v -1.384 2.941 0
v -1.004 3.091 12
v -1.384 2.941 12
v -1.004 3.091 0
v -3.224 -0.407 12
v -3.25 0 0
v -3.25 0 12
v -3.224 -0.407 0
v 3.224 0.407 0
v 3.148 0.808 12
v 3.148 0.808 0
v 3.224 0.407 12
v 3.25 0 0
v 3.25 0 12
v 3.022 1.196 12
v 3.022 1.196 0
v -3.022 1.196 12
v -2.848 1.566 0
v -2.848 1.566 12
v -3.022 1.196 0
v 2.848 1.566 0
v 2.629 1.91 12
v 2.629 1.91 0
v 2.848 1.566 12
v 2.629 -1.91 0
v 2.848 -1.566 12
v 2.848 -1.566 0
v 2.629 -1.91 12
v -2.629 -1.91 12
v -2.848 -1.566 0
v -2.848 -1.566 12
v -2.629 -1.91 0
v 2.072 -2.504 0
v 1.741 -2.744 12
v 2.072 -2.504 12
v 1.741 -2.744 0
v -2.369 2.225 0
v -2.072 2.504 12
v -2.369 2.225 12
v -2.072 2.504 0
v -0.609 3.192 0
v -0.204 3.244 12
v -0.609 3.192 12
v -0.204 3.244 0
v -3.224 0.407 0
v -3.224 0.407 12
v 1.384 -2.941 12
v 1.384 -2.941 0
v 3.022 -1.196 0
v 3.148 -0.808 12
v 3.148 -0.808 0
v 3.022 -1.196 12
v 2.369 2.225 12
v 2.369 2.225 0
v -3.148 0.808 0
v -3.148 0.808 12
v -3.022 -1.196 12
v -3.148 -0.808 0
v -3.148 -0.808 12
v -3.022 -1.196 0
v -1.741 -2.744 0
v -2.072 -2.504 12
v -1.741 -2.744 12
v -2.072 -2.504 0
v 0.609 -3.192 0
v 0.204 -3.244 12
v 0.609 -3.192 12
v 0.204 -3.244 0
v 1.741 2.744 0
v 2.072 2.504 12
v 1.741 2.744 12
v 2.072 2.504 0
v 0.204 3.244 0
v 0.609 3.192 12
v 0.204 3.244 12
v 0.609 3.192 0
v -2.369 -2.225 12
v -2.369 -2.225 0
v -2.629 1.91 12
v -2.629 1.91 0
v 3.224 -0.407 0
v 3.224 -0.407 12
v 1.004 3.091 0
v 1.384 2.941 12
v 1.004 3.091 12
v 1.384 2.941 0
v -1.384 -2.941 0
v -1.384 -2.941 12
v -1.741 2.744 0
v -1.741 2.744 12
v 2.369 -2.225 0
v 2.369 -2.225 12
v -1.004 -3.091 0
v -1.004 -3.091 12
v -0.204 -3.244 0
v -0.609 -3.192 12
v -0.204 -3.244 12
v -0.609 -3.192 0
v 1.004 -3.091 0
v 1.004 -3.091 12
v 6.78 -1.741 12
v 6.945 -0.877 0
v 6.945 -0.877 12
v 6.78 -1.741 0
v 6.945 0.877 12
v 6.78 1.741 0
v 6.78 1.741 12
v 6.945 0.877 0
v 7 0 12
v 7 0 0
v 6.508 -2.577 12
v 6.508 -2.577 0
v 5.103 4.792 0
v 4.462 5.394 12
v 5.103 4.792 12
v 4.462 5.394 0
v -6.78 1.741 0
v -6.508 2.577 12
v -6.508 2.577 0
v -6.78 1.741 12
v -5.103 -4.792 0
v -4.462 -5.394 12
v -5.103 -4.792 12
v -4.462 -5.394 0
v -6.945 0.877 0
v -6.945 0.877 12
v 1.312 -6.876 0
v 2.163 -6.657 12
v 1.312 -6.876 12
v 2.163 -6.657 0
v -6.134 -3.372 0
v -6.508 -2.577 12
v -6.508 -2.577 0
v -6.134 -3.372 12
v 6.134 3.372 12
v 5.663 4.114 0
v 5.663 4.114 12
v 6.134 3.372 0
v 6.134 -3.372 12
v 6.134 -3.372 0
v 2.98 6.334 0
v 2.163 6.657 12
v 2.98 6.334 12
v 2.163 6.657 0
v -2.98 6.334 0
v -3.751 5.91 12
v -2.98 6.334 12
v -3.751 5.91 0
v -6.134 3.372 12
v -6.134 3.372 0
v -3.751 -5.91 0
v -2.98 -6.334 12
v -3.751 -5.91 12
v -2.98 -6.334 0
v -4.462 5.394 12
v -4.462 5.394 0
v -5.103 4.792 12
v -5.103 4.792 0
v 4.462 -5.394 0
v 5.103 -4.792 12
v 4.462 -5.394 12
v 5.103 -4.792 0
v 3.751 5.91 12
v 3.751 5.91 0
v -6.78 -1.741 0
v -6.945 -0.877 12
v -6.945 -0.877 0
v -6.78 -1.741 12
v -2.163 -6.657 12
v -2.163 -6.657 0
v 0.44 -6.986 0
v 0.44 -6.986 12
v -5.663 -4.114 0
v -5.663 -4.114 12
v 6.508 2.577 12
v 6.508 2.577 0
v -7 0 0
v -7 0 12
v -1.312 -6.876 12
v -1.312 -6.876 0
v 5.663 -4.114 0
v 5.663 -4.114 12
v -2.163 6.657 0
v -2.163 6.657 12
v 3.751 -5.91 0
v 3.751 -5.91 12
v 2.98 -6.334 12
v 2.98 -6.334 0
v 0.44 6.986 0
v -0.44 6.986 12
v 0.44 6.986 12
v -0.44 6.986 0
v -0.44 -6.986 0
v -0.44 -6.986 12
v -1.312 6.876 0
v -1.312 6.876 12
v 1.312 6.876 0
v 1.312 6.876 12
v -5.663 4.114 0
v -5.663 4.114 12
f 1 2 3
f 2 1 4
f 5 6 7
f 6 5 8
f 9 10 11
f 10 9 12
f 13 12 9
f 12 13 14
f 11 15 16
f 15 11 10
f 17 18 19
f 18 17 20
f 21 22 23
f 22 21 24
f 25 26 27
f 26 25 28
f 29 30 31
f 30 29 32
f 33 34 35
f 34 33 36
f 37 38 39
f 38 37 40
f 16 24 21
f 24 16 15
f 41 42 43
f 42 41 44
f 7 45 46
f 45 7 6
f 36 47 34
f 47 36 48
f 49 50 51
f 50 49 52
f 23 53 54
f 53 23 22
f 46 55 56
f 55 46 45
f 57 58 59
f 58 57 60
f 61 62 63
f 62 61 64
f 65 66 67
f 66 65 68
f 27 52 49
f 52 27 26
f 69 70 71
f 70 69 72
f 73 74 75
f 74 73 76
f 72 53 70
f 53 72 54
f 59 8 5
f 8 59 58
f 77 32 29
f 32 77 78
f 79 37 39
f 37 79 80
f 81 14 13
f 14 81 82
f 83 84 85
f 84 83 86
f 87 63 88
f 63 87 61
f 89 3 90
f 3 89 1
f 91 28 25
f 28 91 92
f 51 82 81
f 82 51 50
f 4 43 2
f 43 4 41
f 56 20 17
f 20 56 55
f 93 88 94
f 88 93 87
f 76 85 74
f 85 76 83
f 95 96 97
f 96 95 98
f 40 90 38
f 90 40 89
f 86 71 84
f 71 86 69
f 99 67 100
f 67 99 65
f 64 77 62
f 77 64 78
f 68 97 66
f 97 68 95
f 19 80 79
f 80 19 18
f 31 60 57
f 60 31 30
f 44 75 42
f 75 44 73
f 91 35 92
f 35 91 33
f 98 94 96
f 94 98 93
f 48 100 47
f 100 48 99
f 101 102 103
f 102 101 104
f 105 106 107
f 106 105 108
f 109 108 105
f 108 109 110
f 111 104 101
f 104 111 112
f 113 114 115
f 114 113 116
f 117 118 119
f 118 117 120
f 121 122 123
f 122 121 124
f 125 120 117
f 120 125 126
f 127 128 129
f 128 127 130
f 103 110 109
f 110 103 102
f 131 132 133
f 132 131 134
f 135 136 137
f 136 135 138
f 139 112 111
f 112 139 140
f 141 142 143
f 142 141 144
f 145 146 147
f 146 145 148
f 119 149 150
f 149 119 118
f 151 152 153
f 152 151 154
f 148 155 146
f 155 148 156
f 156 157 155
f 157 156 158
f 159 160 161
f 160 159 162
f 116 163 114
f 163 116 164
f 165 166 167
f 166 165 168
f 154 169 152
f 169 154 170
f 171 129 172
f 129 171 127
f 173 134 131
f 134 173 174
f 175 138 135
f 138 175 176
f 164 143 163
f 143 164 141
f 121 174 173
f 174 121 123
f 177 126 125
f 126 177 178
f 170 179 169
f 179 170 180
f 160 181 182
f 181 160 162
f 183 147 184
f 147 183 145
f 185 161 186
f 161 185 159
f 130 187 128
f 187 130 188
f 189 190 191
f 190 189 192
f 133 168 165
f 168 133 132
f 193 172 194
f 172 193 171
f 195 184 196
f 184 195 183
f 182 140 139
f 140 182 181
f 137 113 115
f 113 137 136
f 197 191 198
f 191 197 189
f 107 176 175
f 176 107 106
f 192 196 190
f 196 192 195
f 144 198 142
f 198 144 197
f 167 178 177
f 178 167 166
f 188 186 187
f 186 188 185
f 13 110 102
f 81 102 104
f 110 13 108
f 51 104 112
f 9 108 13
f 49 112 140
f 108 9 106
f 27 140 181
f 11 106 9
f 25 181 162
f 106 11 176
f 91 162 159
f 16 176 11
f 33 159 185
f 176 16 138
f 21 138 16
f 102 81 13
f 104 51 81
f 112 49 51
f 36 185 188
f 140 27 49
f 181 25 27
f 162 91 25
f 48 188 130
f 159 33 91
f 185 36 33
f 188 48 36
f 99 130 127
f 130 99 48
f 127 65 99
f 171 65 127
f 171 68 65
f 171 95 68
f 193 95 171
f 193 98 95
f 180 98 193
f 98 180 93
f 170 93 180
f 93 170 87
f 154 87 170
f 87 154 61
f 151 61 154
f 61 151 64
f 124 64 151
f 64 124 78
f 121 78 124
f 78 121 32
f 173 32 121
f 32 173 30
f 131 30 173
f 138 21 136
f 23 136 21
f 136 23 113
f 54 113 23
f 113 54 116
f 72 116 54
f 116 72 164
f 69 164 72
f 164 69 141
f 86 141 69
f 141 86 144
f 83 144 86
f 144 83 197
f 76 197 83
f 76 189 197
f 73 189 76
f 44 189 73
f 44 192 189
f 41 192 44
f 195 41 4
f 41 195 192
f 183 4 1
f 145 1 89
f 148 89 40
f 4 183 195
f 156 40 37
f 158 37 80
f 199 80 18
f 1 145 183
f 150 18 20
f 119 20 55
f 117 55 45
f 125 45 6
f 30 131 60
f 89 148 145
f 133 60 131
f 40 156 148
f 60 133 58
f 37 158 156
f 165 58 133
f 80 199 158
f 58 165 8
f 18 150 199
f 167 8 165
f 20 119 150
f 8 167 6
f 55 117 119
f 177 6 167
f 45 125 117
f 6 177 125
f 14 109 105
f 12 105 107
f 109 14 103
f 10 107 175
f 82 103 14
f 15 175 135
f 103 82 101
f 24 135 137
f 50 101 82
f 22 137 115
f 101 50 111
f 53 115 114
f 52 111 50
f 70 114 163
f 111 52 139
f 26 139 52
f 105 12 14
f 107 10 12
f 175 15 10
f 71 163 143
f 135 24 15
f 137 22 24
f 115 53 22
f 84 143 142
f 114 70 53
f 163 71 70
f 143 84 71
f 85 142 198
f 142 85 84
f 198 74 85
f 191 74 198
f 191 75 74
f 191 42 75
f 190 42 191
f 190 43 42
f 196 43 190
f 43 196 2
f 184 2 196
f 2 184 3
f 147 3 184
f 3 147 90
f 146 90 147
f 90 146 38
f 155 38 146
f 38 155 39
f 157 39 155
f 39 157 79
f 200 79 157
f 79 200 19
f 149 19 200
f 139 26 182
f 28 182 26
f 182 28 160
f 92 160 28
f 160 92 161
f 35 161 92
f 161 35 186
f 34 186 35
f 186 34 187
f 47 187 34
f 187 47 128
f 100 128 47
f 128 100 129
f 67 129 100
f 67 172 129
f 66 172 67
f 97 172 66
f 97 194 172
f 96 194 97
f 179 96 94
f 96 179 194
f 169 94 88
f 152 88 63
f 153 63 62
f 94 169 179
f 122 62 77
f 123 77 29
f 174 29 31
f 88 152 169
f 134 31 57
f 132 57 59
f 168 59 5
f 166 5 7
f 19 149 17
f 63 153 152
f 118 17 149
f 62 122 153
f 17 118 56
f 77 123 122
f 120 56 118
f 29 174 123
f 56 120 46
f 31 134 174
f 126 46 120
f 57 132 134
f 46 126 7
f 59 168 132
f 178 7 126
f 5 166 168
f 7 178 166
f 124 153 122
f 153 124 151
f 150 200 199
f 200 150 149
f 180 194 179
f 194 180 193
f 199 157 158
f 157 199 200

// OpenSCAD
$fn = 50;


difference() {
	union() {
		cylinder(h = 12, r = 7.0000000000);
	}
	union() {
		translate(v = [0.0000000000, 0.0000000000, -100.0000000000]) {
			cylinder(h = 200, r = 3.2500000000);
		}
		cylinder(h = 12, r = 1.8000000000);
		cylinder(h = 12, r = 1.8000000000);
		cylinder(h = 12, r = 1.8000000000);
	}
}
